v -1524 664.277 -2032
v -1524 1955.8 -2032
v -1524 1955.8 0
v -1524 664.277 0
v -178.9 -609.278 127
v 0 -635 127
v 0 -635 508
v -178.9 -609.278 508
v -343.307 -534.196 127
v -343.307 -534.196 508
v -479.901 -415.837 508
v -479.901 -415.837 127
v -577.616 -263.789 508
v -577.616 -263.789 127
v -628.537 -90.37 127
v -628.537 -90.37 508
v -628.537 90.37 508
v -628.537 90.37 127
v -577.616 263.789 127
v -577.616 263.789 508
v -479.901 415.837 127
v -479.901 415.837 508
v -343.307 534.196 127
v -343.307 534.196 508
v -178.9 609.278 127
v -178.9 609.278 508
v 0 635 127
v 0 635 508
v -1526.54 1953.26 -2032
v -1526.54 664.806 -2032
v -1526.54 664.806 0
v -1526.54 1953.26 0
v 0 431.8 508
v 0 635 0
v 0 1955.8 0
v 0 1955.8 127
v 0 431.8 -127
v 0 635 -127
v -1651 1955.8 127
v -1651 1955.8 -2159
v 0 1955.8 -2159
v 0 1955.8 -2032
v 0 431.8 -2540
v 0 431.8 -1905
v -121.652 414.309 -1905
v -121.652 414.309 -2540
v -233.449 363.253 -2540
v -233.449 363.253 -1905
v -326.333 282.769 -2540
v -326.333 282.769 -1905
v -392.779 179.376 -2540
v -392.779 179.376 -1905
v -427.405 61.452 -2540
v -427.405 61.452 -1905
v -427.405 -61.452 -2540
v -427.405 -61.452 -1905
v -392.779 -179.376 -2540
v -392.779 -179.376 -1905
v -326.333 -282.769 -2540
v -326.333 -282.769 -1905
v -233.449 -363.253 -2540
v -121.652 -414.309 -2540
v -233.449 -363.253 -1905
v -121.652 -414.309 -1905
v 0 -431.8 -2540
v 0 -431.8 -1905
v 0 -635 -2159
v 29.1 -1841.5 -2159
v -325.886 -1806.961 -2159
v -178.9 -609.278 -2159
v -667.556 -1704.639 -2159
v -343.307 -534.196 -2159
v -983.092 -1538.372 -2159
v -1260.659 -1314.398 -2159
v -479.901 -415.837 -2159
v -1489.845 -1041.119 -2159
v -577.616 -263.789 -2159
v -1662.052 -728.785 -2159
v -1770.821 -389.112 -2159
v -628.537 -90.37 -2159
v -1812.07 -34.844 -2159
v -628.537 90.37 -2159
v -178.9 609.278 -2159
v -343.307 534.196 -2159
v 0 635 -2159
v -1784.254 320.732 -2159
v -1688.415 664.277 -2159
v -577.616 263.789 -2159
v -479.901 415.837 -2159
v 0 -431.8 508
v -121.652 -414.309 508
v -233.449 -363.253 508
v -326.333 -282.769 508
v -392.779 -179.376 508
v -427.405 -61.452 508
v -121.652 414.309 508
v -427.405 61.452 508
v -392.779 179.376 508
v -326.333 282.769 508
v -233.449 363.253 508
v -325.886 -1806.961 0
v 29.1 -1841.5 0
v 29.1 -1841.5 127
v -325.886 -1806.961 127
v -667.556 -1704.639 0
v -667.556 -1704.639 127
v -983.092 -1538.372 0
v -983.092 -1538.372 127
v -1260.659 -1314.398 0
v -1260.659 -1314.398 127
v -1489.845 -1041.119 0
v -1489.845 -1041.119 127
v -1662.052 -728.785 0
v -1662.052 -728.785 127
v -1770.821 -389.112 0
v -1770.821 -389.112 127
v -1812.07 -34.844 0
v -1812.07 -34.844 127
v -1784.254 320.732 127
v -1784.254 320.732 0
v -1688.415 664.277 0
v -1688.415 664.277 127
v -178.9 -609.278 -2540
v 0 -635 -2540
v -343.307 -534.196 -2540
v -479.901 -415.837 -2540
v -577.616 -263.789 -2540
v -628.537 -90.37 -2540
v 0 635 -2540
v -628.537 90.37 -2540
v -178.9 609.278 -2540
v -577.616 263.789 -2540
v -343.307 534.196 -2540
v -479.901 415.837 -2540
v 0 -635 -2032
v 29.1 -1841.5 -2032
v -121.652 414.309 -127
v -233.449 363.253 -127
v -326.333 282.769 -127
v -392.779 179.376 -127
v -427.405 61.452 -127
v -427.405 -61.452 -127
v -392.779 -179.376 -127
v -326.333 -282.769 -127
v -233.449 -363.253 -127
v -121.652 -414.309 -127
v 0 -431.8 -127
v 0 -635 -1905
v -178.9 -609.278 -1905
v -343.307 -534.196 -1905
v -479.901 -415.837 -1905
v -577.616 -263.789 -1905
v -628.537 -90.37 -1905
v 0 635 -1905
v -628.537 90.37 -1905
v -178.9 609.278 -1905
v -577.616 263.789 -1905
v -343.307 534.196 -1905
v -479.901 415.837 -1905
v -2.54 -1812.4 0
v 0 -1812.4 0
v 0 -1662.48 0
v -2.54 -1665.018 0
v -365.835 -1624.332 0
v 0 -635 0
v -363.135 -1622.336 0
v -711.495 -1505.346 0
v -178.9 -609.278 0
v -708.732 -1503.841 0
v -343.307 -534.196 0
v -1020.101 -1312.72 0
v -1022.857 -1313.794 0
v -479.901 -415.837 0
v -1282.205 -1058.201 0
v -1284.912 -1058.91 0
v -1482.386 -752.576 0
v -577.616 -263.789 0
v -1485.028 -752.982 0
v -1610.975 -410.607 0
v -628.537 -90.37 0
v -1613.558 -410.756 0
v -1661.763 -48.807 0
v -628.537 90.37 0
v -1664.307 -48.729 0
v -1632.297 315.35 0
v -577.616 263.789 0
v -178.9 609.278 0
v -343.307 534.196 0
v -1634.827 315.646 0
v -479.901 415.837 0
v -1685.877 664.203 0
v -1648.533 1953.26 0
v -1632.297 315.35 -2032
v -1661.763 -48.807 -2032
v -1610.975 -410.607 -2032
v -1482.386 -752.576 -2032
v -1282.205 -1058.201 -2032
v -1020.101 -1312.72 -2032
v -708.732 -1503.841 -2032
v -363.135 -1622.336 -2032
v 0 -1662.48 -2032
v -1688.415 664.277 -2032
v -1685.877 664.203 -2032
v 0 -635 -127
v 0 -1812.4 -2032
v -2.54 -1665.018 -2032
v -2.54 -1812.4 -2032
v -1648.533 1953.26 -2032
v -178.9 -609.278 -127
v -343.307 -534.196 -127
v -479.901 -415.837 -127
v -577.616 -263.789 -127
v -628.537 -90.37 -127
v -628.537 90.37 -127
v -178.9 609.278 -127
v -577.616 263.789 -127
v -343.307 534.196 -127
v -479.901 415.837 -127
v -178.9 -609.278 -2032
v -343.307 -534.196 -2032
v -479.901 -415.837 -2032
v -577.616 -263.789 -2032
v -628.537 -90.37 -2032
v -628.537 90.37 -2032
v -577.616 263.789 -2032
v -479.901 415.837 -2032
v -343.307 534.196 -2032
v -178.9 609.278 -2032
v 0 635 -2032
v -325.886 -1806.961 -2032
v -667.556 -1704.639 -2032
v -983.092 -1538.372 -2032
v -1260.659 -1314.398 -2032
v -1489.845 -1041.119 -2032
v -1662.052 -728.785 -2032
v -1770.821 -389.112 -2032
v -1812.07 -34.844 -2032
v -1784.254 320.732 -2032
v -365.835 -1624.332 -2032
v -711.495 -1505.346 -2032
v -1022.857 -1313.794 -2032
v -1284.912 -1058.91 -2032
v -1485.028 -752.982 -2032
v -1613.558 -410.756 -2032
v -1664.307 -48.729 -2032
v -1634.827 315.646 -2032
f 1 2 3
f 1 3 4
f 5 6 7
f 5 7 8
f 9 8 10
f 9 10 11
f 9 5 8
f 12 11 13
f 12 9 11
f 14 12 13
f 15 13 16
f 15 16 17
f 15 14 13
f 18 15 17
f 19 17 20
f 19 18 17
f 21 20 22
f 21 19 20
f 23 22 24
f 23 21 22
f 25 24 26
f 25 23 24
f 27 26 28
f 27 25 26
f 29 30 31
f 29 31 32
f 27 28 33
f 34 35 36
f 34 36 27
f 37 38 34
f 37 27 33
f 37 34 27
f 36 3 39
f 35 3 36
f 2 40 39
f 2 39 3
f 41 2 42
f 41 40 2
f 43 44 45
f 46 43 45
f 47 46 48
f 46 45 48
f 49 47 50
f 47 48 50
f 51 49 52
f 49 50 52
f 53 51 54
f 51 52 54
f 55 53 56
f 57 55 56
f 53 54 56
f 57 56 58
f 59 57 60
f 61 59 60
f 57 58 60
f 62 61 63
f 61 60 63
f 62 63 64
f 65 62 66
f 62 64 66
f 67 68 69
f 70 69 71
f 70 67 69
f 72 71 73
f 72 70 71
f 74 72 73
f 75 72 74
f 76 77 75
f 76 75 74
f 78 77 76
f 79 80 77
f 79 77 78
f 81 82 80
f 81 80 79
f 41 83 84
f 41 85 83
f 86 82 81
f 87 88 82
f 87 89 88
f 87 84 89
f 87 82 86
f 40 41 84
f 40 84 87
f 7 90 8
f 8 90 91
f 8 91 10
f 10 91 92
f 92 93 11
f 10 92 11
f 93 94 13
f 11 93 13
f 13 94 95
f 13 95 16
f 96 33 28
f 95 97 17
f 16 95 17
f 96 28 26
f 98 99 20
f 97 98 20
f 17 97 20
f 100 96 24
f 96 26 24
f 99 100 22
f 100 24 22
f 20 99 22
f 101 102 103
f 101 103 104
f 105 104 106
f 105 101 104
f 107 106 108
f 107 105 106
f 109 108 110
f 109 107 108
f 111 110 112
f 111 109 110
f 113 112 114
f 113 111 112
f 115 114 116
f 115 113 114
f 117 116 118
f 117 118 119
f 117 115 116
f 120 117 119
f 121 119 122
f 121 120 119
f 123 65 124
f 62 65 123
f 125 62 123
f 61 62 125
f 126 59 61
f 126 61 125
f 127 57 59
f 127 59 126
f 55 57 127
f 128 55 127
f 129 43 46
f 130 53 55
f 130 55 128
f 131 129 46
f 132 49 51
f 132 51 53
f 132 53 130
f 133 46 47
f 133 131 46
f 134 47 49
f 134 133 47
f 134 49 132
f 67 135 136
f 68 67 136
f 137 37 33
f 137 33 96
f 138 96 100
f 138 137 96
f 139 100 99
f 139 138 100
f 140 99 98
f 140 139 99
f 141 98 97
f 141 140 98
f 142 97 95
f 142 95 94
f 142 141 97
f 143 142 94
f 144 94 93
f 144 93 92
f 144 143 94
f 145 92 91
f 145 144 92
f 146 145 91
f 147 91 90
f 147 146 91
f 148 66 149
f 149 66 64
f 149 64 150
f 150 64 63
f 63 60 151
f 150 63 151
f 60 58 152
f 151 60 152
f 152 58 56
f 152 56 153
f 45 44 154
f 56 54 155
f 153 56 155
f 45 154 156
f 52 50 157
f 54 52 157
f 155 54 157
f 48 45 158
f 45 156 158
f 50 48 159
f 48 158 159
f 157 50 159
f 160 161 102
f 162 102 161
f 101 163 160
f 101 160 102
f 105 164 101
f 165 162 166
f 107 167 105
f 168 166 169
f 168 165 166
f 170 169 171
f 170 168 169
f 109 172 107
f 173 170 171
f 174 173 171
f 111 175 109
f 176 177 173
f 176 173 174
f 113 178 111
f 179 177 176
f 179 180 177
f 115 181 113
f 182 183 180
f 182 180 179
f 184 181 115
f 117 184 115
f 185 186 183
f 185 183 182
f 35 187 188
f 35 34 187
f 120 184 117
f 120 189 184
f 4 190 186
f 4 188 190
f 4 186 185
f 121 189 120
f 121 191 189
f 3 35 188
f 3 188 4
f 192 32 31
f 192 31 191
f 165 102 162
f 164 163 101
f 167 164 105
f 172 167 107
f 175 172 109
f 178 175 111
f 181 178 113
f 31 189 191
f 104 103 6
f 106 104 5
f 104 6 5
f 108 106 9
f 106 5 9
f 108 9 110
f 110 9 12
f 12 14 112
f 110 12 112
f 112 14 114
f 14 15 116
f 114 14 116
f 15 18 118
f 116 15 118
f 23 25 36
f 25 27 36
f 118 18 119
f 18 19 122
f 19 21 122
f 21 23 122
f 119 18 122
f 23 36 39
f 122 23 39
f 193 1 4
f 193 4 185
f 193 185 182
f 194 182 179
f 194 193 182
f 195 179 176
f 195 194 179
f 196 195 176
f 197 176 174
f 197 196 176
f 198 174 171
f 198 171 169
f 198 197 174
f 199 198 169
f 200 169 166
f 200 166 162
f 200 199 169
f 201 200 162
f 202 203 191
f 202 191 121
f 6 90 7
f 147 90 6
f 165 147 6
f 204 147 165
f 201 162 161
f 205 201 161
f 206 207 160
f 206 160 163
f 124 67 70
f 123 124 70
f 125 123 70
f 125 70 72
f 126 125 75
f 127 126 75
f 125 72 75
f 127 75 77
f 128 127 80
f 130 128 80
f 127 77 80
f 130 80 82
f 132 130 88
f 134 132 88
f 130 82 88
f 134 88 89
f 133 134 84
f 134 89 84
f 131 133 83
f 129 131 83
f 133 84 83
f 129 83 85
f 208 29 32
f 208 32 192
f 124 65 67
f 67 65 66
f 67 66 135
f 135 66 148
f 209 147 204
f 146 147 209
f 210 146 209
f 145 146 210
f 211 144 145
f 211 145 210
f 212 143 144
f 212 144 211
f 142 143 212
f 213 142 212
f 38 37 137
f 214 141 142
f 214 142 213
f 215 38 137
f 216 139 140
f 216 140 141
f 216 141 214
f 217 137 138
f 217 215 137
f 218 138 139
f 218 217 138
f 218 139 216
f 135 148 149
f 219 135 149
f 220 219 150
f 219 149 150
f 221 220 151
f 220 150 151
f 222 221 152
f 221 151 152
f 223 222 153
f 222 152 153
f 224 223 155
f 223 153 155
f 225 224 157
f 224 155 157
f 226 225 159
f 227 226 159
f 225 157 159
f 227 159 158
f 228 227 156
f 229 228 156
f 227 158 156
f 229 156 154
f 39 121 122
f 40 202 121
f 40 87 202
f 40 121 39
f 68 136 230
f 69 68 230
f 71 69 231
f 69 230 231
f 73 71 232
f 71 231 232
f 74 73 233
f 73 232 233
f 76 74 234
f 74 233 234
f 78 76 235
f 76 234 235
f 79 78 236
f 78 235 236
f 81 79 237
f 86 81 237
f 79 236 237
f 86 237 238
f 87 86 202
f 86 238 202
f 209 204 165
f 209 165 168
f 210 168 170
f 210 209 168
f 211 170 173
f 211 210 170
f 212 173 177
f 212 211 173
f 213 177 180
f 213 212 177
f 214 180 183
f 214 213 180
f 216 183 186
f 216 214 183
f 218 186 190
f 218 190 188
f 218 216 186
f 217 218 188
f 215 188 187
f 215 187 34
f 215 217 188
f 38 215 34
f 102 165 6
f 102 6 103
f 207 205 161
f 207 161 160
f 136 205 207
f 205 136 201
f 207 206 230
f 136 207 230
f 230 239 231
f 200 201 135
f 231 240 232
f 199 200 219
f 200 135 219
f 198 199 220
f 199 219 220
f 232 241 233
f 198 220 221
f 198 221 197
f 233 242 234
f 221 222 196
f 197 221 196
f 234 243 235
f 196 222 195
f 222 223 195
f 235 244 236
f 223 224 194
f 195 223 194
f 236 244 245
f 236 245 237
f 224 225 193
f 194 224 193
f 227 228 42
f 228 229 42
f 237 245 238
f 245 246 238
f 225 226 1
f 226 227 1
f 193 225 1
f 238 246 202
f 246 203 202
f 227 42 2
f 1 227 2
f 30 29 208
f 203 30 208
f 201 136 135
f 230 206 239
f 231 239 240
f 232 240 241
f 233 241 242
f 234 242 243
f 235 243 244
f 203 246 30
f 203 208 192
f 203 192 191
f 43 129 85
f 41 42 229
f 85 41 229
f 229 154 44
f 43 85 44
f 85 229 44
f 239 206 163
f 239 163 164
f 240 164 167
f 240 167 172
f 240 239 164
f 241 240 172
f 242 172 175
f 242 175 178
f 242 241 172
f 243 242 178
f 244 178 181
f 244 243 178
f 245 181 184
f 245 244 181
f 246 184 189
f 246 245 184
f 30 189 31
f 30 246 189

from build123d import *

# Parameters (mm, degrees)
BOSS_EXTRUDE1_DEPTH      = 508
BOSS_EXTRUDE1_DEPTH_BACK = 127
BOSS_EXTRUDE2_DEPTH      = 127
EXTRUDE_THIN1_DEPTH      = 2032


with BuildPart() as part:
    # Sketch1 → Boss-Extrude1 (new, two sides: drawn at the far end of the back side and taken through both)
    with BuildSketch(Plane.XY.offset(-BOSS_EXTRUDE1_DEPTH_BACK)):
        with BuildLine():
            Line((0, 635), (0, 431.8))
            ThreePointArc((0, 431.8), (-431.8, 0), (0, -431.8))
            Line((0, -431.8), (0, -635))
            ThreePointArc((0, -635), (-635, 0), (0, 635))
        make_face()
    extrude(amount=BOSS_EXTRUDE1_DEPTH + BOSS_EXTRUDE1_DEPTH_BACK)

    # Sketch3 → Boss-Extrude2 (add)
    with BuildSketch(Plane.XY):
        with BuildLine():
            ThreePointArc((0, 635), (-606.566566409, 0), (0, -635))
            Line((0, -635), (29.099856858, -1841.5))
            ThreePointArc((29.099856858, -1841.5), (-1489.845114235, -1041.118833174), (-1688.415446927, 664.276622547))
            Line((-1688.415446927, 664.276622547), (-1651, 1955.8))
            Line((-1651, 1955.8), (0, 1955.8))
            Line((0, 1955.8), (0, 635))
        make_face()
    extrude(amount=BOSS_EXTRUDE2_DEPTH)


with BuildPart() as body_2:
    # Mirror1: mirrored copy
    add(part.part.mirror(Plane.XY.offset(-1016)))


with BuildPart() as part_1:
    add(part.part)

    add(body_2.part)  # Extrude-Thin1 merges body 2
    # Sketch4 → Extrude-Thin1 (add)
    with BuildSketch(Plane.XY.offset(-2032)):
        with BuildLine():
            Line((-1688.415446927, 664.276622547), (-1651, 1955.8))
            Line((-1651, 1955.8), (-1524, 1955.8))
            Line((-1524, 1955.8), (-1524, 664.276622547))
            ThreePointArc((-1524, 664.276622547), (-1390.716715754, -910.904192429), (0, -1662.479904018))
            Line((0, -1662.479904018), (0, -1812.400143142))
            Line((0, -1812.400143142), (-2.54, -1812.400143142))
            Line((-2.54, -1812.400143142), (-2.54, -1665.017966622))
            ThreePointArc((-2.54, -1665.017966622), (-1393.391992742, -911.454900332), (-1526.54, 664.805918427))
            Line((-1526.54, 664.805918427), (-1526.54, 1953.26))
            Line((-1526.54, 1953.26), (-1648.53251819, 1953.26))
            Line((-1648.53251819, 1953.26), (-1685.876512119, 664.203069577))
            Line((-1685.876512119, 664.203069577), (-1688.415446927, 664.276622547))
        make_face()
    extrude(amount=EXTRUDE_THIN1_DEPTH)


solid = part_1.part
